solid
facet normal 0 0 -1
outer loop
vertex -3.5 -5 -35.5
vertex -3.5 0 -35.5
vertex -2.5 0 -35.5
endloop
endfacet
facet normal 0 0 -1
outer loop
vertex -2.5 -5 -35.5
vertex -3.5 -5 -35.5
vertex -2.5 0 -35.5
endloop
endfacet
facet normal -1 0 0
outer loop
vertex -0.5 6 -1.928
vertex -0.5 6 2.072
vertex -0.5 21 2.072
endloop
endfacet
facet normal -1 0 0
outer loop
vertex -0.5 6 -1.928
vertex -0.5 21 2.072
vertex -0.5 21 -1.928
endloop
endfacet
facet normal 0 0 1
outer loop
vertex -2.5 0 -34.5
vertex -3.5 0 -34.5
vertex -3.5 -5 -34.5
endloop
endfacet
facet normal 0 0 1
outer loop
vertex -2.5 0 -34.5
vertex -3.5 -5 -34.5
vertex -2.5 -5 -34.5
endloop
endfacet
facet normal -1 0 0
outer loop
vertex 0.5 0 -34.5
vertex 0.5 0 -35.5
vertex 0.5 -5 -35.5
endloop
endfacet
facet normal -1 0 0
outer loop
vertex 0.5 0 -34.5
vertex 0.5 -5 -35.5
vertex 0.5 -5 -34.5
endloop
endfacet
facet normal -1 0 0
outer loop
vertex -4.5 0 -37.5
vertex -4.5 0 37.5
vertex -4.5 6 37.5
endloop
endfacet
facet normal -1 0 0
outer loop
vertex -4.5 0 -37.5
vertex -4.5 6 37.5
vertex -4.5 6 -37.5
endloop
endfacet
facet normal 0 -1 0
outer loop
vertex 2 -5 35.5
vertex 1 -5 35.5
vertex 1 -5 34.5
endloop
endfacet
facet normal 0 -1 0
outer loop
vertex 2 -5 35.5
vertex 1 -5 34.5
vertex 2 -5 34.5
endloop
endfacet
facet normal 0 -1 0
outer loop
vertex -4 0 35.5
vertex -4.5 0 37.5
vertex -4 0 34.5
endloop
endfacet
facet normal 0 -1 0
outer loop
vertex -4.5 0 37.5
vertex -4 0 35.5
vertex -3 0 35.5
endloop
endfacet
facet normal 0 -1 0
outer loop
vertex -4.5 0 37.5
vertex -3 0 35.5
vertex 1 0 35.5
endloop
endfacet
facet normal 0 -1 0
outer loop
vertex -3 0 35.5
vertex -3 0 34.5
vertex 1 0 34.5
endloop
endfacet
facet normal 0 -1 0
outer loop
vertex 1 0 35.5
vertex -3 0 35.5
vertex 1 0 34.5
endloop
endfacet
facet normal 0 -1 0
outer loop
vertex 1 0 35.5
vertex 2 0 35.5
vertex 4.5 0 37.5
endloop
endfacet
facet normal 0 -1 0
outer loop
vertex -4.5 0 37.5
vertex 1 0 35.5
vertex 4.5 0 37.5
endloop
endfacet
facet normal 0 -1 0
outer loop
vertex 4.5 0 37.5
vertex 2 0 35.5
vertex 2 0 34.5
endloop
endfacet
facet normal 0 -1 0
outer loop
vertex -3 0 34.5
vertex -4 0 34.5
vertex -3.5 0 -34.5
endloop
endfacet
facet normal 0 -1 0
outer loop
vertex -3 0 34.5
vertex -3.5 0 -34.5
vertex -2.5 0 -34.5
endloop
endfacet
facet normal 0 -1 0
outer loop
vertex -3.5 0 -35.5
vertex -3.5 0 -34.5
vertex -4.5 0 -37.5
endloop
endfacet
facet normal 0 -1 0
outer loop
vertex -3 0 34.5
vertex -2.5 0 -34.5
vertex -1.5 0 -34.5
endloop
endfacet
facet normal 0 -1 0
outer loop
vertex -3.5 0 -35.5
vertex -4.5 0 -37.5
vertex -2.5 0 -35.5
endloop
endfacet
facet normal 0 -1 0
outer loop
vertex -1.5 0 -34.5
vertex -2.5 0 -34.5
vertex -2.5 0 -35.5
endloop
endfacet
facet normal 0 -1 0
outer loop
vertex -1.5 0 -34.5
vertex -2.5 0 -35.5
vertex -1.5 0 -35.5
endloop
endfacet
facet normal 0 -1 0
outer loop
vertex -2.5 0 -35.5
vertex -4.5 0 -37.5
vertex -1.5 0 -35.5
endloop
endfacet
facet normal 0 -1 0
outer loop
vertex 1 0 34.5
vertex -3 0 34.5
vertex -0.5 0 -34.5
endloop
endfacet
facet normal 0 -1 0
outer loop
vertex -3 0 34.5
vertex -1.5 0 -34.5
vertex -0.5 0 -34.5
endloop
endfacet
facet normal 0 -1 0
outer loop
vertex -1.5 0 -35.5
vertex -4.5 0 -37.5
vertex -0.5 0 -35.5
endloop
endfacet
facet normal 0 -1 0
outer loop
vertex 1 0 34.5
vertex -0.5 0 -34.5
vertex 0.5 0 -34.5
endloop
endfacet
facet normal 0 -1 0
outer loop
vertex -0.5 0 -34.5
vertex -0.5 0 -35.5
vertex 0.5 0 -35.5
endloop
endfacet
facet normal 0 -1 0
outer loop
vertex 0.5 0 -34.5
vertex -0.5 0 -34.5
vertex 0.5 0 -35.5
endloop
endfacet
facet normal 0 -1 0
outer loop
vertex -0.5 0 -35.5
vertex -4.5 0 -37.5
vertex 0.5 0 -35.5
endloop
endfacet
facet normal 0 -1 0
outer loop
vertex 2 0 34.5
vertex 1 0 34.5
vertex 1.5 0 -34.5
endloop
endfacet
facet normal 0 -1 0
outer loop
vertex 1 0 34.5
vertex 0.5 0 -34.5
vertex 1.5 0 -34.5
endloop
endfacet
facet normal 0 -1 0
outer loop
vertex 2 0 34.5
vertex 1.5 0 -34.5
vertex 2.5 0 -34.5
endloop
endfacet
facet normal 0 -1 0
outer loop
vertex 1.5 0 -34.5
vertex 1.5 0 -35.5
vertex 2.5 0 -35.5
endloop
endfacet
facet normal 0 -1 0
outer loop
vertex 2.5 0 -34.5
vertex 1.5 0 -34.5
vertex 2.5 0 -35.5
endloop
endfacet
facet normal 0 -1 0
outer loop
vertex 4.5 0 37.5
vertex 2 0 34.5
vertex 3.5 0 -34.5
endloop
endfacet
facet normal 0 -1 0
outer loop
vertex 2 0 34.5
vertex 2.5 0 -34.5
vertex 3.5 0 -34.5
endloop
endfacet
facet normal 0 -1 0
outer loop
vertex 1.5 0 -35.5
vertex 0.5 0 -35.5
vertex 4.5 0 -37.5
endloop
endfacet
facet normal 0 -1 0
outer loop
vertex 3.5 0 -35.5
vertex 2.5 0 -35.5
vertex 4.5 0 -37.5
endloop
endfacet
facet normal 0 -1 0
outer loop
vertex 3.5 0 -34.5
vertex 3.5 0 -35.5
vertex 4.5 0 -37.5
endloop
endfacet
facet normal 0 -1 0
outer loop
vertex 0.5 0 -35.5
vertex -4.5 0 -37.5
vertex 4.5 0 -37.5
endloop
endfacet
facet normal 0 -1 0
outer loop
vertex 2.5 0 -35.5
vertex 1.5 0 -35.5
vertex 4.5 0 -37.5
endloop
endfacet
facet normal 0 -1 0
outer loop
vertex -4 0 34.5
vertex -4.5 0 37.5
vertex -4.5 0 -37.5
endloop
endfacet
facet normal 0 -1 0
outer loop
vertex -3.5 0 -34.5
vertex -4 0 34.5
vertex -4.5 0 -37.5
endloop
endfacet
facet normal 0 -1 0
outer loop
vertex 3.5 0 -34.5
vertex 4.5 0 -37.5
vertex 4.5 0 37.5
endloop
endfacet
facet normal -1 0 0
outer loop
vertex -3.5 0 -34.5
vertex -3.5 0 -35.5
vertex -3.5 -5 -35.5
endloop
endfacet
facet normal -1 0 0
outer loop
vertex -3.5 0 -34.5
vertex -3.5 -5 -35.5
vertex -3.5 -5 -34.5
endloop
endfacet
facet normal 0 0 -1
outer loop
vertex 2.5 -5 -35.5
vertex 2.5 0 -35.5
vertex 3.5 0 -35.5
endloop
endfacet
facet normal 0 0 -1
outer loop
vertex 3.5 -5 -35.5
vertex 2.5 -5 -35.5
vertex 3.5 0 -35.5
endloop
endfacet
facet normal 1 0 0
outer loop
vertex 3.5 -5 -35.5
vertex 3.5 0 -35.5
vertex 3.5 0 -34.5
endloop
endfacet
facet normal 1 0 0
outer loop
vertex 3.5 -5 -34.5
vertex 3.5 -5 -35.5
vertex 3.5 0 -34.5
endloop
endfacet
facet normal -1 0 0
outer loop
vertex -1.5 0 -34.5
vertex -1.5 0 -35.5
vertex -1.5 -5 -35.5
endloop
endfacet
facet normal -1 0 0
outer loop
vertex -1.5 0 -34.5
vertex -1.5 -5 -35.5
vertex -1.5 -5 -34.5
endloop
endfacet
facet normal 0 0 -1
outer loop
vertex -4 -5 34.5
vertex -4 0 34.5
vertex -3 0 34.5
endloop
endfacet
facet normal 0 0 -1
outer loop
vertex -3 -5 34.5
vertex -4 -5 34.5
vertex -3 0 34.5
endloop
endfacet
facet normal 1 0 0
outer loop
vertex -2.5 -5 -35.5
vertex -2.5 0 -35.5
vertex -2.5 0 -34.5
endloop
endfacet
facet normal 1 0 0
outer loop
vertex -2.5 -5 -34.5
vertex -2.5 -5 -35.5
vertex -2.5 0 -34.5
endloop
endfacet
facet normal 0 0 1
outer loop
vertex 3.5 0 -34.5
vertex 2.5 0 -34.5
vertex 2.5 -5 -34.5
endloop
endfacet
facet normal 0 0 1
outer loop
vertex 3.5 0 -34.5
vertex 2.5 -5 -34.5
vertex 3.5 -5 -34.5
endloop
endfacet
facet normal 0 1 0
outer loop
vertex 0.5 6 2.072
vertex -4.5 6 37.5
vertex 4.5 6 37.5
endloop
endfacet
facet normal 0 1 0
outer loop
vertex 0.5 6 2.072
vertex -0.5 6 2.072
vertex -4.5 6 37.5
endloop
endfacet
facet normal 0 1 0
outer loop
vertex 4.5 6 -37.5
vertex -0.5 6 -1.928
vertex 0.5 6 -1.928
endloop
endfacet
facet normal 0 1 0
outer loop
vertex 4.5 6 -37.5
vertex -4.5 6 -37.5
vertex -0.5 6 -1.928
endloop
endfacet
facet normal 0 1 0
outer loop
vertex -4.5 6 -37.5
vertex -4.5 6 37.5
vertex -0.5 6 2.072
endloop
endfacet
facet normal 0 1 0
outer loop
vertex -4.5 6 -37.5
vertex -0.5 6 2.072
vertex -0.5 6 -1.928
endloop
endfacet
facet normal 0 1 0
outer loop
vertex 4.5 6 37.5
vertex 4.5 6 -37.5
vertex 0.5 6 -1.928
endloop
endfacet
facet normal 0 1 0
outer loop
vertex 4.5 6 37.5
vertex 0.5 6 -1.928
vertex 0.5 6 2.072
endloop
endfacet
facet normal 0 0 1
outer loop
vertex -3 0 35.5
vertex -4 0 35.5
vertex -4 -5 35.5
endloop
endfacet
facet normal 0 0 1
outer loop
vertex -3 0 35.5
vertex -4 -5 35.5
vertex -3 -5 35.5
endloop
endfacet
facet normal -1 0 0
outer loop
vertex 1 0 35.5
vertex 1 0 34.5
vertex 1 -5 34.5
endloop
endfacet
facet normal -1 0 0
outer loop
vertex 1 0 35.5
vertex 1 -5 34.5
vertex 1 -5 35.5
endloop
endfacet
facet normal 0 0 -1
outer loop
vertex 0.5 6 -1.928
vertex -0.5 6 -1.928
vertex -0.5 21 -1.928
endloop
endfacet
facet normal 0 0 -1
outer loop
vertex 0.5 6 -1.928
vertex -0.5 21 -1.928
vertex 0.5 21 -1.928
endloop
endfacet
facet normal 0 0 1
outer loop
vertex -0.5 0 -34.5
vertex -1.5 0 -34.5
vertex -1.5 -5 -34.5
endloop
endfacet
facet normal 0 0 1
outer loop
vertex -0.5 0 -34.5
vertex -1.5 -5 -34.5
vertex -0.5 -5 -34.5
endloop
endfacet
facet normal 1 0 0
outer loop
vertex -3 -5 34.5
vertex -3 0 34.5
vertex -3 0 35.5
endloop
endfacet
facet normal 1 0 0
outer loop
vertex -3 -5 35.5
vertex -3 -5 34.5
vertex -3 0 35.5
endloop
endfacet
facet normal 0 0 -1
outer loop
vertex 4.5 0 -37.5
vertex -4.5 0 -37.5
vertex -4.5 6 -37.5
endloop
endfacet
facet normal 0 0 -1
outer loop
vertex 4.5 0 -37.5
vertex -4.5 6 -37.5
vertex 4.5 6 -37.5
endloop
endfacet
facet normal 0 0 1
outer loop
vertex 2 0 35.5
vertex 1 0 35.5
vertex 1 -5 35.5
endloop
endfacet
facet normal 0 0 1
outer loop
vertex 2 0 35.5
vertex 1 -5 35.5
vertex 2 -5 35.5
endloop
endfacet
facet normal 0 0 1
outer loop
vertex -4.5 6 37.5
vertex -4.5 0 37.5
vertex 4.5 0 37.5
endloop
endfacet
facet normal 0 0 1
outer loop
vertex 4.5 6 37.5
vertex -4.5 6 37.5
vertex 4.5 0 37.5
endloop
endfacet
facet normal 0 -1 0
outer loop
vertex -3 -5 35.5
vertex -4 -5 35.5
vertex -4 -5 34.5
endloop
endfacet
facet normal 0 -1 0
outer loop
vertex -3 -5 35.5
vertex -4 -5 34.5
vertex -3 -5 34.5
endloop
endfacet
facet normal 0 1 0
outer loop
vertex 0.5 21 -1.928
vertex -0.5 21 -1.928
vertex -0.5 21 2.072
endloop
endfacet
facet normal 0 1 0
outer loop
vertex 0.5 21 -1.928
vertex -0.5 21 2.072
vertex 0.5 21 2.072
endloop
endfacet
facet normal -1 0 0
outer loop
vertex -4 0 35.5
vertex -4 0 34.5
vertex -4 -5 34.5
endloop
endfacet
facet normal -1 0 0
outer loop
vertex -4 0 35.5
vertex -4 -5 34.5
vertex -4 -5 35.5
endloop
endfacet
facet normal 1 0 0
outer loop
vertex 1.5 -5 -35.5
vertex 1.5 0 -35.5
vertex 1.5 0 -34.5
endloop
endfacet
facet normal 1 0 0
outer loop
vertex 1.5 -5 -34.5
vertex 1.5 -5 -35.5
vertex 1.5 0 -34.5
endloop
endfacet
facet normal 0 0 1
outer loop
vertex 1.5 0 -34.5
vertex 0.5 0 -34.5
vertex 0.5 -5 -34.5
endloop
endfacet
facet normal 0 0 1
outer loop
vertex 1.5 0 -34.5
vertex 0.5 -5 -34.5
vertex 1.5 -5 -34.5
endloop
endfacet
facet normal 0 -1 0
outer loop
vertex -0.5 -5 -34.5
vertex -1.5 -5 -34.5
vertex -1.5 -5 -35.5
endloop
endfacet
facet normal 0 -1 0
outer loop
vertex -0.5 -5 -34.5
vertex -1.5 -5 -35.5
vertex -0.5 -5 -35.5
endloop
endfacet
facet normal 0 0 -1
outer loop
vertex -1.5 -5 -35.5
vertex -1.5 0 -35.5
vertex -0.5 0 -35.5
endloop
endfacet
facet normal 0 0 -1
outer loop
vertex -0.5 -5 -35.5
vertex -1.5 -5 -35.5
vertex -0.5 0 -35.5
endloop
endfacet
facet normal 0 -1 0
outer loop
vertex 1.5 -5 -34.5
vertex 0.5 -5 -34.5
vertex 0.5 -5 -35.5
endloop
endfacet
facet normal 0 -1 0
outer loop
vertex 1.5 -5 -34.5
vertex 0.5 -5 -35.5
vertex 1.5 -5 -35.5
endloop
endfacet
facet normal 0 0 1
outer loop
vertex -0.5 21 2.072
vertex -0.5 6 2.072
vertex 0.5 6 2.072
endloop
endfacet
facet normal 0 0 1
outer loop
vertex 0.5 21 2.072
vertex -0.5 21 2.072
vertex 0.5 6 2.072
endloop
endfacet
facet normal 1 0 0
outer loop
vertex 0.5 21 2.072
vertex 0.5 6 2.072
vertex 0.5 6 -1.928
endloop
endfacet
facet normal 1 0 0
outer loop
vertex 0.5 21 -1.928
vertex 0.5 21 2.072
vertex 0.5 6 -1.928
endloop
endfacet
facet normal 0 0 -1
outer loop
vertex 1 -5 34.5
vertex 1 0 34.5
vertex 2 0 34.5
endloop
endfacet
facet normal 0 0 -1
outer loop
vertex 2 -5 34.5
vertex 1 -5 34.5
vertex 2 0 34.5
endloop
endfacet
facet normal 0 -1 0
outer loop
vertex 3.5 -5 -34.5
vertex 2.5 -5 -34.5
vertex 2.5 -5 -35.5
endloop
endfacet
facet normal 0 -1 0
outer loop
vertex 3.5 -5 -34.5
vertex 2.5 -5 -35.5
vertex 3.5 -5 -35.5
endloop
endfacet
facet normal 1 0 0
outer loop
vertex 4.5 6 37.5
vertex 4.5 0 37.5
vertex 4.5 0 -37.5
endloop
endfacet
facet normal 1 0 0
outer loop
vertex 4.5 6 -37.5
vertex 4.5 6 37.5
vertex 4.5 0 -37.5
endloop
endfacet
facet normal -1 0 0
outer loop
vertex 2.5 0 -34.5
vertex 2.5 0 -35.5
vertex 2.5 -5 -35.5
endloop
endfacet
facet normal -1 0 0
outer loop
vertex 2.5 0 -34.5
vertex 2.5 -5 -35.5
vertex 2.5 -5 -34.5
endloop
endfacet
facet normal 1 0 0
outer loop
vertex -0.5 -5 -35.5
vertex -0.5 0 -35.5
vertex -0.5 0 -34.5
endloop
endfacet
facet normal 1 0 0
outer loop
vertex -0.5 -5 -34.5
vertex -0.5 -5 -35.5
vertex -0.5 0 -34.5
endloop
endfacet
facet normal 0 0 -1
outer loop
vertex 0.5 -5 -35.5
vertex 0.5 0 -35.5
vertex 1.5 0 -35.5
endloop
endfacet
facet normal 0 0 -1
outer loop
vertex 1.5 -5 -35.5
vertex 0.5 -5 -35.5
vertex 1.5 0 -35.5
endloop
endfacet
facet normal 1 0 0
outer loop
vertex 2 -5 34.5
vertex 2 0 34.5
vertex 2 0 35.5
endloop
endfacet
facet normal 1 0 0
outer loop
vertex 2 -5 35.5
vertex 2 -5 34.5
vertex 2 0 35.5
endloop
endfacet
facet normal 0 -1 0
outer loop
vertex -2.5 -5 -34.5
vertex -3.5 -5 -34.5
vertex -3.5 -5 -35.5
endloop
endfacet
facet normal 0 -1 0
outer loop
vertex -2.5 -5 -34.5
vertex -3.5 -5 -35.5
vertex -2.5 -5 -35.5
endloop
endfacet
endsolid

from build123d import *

# Parameters (mm, degrees)
SKETCH1_W           = 9
SKETCH1_H           = 75
BOSS_EXTRUDE1_DEPTH = 6
SKETCH2_W           = 1
SKETCH2_H           = 4
BOSS_EXTRUDE2_DEPTH = 15
SKETCH4_W           = 1
SKETCH4_H           = 1
BOSS_EXTRUDE3_DEPTH = 5


with BuildPart() as part:
    # Sketch1 → Boss-Extrude1 (new body)
    with BuildSketch(Plane(origin=(0, 0, 0), x_dir=(1, 0, 0), z_dir=(0, 1, 0))):
        Rectangle(SKETCH1_W, SKETCH1_H)
    extrude(amount=BOSS_EXTRUDE1_DEPTH)

    # Sketch2 → Boss-Extrude2 (add)
    with BuildSketch(Plane(origin=(0, 6, 0), x_dir=(1, 0, 0), z_dir=(0, 1, 0))):
        with Locations((0, -0.071668646)):
            Rectangle(SKETCH2_W, SKETCH2_H)
    extrude(amount=BOSS_EXTRUDE2_DEPTH)

    # Sketch4 → Boss-Extrude3 (add)
    with BuildSketch(Plane.XZ):
        with Locations((-3.5, 35)):
            Rectangle(SKETCH4_W, SKETCH4_H)
        with Locations((1.5, 35)):
            Rectangle(SKETCH4_W, SKETCH4_H)
        with Locations((-3, -35)):
            Rectangle(SKETCH4_W, SKETCH4_H)
        with Locations((-1, -35)):
            Rectangle(SKETCH4_W, SKETCH4_H)
        with Locations((1, -35)):
            Rectangle(SKETCH4_W, SKETCH4_H)
        with Locations((3, -35)):
            Rectangle(SKETCH4_W, SKETCH4_H)
    extrude(amount=BOSS_EXTRUDE3_DEPTH)


solid = part.part
